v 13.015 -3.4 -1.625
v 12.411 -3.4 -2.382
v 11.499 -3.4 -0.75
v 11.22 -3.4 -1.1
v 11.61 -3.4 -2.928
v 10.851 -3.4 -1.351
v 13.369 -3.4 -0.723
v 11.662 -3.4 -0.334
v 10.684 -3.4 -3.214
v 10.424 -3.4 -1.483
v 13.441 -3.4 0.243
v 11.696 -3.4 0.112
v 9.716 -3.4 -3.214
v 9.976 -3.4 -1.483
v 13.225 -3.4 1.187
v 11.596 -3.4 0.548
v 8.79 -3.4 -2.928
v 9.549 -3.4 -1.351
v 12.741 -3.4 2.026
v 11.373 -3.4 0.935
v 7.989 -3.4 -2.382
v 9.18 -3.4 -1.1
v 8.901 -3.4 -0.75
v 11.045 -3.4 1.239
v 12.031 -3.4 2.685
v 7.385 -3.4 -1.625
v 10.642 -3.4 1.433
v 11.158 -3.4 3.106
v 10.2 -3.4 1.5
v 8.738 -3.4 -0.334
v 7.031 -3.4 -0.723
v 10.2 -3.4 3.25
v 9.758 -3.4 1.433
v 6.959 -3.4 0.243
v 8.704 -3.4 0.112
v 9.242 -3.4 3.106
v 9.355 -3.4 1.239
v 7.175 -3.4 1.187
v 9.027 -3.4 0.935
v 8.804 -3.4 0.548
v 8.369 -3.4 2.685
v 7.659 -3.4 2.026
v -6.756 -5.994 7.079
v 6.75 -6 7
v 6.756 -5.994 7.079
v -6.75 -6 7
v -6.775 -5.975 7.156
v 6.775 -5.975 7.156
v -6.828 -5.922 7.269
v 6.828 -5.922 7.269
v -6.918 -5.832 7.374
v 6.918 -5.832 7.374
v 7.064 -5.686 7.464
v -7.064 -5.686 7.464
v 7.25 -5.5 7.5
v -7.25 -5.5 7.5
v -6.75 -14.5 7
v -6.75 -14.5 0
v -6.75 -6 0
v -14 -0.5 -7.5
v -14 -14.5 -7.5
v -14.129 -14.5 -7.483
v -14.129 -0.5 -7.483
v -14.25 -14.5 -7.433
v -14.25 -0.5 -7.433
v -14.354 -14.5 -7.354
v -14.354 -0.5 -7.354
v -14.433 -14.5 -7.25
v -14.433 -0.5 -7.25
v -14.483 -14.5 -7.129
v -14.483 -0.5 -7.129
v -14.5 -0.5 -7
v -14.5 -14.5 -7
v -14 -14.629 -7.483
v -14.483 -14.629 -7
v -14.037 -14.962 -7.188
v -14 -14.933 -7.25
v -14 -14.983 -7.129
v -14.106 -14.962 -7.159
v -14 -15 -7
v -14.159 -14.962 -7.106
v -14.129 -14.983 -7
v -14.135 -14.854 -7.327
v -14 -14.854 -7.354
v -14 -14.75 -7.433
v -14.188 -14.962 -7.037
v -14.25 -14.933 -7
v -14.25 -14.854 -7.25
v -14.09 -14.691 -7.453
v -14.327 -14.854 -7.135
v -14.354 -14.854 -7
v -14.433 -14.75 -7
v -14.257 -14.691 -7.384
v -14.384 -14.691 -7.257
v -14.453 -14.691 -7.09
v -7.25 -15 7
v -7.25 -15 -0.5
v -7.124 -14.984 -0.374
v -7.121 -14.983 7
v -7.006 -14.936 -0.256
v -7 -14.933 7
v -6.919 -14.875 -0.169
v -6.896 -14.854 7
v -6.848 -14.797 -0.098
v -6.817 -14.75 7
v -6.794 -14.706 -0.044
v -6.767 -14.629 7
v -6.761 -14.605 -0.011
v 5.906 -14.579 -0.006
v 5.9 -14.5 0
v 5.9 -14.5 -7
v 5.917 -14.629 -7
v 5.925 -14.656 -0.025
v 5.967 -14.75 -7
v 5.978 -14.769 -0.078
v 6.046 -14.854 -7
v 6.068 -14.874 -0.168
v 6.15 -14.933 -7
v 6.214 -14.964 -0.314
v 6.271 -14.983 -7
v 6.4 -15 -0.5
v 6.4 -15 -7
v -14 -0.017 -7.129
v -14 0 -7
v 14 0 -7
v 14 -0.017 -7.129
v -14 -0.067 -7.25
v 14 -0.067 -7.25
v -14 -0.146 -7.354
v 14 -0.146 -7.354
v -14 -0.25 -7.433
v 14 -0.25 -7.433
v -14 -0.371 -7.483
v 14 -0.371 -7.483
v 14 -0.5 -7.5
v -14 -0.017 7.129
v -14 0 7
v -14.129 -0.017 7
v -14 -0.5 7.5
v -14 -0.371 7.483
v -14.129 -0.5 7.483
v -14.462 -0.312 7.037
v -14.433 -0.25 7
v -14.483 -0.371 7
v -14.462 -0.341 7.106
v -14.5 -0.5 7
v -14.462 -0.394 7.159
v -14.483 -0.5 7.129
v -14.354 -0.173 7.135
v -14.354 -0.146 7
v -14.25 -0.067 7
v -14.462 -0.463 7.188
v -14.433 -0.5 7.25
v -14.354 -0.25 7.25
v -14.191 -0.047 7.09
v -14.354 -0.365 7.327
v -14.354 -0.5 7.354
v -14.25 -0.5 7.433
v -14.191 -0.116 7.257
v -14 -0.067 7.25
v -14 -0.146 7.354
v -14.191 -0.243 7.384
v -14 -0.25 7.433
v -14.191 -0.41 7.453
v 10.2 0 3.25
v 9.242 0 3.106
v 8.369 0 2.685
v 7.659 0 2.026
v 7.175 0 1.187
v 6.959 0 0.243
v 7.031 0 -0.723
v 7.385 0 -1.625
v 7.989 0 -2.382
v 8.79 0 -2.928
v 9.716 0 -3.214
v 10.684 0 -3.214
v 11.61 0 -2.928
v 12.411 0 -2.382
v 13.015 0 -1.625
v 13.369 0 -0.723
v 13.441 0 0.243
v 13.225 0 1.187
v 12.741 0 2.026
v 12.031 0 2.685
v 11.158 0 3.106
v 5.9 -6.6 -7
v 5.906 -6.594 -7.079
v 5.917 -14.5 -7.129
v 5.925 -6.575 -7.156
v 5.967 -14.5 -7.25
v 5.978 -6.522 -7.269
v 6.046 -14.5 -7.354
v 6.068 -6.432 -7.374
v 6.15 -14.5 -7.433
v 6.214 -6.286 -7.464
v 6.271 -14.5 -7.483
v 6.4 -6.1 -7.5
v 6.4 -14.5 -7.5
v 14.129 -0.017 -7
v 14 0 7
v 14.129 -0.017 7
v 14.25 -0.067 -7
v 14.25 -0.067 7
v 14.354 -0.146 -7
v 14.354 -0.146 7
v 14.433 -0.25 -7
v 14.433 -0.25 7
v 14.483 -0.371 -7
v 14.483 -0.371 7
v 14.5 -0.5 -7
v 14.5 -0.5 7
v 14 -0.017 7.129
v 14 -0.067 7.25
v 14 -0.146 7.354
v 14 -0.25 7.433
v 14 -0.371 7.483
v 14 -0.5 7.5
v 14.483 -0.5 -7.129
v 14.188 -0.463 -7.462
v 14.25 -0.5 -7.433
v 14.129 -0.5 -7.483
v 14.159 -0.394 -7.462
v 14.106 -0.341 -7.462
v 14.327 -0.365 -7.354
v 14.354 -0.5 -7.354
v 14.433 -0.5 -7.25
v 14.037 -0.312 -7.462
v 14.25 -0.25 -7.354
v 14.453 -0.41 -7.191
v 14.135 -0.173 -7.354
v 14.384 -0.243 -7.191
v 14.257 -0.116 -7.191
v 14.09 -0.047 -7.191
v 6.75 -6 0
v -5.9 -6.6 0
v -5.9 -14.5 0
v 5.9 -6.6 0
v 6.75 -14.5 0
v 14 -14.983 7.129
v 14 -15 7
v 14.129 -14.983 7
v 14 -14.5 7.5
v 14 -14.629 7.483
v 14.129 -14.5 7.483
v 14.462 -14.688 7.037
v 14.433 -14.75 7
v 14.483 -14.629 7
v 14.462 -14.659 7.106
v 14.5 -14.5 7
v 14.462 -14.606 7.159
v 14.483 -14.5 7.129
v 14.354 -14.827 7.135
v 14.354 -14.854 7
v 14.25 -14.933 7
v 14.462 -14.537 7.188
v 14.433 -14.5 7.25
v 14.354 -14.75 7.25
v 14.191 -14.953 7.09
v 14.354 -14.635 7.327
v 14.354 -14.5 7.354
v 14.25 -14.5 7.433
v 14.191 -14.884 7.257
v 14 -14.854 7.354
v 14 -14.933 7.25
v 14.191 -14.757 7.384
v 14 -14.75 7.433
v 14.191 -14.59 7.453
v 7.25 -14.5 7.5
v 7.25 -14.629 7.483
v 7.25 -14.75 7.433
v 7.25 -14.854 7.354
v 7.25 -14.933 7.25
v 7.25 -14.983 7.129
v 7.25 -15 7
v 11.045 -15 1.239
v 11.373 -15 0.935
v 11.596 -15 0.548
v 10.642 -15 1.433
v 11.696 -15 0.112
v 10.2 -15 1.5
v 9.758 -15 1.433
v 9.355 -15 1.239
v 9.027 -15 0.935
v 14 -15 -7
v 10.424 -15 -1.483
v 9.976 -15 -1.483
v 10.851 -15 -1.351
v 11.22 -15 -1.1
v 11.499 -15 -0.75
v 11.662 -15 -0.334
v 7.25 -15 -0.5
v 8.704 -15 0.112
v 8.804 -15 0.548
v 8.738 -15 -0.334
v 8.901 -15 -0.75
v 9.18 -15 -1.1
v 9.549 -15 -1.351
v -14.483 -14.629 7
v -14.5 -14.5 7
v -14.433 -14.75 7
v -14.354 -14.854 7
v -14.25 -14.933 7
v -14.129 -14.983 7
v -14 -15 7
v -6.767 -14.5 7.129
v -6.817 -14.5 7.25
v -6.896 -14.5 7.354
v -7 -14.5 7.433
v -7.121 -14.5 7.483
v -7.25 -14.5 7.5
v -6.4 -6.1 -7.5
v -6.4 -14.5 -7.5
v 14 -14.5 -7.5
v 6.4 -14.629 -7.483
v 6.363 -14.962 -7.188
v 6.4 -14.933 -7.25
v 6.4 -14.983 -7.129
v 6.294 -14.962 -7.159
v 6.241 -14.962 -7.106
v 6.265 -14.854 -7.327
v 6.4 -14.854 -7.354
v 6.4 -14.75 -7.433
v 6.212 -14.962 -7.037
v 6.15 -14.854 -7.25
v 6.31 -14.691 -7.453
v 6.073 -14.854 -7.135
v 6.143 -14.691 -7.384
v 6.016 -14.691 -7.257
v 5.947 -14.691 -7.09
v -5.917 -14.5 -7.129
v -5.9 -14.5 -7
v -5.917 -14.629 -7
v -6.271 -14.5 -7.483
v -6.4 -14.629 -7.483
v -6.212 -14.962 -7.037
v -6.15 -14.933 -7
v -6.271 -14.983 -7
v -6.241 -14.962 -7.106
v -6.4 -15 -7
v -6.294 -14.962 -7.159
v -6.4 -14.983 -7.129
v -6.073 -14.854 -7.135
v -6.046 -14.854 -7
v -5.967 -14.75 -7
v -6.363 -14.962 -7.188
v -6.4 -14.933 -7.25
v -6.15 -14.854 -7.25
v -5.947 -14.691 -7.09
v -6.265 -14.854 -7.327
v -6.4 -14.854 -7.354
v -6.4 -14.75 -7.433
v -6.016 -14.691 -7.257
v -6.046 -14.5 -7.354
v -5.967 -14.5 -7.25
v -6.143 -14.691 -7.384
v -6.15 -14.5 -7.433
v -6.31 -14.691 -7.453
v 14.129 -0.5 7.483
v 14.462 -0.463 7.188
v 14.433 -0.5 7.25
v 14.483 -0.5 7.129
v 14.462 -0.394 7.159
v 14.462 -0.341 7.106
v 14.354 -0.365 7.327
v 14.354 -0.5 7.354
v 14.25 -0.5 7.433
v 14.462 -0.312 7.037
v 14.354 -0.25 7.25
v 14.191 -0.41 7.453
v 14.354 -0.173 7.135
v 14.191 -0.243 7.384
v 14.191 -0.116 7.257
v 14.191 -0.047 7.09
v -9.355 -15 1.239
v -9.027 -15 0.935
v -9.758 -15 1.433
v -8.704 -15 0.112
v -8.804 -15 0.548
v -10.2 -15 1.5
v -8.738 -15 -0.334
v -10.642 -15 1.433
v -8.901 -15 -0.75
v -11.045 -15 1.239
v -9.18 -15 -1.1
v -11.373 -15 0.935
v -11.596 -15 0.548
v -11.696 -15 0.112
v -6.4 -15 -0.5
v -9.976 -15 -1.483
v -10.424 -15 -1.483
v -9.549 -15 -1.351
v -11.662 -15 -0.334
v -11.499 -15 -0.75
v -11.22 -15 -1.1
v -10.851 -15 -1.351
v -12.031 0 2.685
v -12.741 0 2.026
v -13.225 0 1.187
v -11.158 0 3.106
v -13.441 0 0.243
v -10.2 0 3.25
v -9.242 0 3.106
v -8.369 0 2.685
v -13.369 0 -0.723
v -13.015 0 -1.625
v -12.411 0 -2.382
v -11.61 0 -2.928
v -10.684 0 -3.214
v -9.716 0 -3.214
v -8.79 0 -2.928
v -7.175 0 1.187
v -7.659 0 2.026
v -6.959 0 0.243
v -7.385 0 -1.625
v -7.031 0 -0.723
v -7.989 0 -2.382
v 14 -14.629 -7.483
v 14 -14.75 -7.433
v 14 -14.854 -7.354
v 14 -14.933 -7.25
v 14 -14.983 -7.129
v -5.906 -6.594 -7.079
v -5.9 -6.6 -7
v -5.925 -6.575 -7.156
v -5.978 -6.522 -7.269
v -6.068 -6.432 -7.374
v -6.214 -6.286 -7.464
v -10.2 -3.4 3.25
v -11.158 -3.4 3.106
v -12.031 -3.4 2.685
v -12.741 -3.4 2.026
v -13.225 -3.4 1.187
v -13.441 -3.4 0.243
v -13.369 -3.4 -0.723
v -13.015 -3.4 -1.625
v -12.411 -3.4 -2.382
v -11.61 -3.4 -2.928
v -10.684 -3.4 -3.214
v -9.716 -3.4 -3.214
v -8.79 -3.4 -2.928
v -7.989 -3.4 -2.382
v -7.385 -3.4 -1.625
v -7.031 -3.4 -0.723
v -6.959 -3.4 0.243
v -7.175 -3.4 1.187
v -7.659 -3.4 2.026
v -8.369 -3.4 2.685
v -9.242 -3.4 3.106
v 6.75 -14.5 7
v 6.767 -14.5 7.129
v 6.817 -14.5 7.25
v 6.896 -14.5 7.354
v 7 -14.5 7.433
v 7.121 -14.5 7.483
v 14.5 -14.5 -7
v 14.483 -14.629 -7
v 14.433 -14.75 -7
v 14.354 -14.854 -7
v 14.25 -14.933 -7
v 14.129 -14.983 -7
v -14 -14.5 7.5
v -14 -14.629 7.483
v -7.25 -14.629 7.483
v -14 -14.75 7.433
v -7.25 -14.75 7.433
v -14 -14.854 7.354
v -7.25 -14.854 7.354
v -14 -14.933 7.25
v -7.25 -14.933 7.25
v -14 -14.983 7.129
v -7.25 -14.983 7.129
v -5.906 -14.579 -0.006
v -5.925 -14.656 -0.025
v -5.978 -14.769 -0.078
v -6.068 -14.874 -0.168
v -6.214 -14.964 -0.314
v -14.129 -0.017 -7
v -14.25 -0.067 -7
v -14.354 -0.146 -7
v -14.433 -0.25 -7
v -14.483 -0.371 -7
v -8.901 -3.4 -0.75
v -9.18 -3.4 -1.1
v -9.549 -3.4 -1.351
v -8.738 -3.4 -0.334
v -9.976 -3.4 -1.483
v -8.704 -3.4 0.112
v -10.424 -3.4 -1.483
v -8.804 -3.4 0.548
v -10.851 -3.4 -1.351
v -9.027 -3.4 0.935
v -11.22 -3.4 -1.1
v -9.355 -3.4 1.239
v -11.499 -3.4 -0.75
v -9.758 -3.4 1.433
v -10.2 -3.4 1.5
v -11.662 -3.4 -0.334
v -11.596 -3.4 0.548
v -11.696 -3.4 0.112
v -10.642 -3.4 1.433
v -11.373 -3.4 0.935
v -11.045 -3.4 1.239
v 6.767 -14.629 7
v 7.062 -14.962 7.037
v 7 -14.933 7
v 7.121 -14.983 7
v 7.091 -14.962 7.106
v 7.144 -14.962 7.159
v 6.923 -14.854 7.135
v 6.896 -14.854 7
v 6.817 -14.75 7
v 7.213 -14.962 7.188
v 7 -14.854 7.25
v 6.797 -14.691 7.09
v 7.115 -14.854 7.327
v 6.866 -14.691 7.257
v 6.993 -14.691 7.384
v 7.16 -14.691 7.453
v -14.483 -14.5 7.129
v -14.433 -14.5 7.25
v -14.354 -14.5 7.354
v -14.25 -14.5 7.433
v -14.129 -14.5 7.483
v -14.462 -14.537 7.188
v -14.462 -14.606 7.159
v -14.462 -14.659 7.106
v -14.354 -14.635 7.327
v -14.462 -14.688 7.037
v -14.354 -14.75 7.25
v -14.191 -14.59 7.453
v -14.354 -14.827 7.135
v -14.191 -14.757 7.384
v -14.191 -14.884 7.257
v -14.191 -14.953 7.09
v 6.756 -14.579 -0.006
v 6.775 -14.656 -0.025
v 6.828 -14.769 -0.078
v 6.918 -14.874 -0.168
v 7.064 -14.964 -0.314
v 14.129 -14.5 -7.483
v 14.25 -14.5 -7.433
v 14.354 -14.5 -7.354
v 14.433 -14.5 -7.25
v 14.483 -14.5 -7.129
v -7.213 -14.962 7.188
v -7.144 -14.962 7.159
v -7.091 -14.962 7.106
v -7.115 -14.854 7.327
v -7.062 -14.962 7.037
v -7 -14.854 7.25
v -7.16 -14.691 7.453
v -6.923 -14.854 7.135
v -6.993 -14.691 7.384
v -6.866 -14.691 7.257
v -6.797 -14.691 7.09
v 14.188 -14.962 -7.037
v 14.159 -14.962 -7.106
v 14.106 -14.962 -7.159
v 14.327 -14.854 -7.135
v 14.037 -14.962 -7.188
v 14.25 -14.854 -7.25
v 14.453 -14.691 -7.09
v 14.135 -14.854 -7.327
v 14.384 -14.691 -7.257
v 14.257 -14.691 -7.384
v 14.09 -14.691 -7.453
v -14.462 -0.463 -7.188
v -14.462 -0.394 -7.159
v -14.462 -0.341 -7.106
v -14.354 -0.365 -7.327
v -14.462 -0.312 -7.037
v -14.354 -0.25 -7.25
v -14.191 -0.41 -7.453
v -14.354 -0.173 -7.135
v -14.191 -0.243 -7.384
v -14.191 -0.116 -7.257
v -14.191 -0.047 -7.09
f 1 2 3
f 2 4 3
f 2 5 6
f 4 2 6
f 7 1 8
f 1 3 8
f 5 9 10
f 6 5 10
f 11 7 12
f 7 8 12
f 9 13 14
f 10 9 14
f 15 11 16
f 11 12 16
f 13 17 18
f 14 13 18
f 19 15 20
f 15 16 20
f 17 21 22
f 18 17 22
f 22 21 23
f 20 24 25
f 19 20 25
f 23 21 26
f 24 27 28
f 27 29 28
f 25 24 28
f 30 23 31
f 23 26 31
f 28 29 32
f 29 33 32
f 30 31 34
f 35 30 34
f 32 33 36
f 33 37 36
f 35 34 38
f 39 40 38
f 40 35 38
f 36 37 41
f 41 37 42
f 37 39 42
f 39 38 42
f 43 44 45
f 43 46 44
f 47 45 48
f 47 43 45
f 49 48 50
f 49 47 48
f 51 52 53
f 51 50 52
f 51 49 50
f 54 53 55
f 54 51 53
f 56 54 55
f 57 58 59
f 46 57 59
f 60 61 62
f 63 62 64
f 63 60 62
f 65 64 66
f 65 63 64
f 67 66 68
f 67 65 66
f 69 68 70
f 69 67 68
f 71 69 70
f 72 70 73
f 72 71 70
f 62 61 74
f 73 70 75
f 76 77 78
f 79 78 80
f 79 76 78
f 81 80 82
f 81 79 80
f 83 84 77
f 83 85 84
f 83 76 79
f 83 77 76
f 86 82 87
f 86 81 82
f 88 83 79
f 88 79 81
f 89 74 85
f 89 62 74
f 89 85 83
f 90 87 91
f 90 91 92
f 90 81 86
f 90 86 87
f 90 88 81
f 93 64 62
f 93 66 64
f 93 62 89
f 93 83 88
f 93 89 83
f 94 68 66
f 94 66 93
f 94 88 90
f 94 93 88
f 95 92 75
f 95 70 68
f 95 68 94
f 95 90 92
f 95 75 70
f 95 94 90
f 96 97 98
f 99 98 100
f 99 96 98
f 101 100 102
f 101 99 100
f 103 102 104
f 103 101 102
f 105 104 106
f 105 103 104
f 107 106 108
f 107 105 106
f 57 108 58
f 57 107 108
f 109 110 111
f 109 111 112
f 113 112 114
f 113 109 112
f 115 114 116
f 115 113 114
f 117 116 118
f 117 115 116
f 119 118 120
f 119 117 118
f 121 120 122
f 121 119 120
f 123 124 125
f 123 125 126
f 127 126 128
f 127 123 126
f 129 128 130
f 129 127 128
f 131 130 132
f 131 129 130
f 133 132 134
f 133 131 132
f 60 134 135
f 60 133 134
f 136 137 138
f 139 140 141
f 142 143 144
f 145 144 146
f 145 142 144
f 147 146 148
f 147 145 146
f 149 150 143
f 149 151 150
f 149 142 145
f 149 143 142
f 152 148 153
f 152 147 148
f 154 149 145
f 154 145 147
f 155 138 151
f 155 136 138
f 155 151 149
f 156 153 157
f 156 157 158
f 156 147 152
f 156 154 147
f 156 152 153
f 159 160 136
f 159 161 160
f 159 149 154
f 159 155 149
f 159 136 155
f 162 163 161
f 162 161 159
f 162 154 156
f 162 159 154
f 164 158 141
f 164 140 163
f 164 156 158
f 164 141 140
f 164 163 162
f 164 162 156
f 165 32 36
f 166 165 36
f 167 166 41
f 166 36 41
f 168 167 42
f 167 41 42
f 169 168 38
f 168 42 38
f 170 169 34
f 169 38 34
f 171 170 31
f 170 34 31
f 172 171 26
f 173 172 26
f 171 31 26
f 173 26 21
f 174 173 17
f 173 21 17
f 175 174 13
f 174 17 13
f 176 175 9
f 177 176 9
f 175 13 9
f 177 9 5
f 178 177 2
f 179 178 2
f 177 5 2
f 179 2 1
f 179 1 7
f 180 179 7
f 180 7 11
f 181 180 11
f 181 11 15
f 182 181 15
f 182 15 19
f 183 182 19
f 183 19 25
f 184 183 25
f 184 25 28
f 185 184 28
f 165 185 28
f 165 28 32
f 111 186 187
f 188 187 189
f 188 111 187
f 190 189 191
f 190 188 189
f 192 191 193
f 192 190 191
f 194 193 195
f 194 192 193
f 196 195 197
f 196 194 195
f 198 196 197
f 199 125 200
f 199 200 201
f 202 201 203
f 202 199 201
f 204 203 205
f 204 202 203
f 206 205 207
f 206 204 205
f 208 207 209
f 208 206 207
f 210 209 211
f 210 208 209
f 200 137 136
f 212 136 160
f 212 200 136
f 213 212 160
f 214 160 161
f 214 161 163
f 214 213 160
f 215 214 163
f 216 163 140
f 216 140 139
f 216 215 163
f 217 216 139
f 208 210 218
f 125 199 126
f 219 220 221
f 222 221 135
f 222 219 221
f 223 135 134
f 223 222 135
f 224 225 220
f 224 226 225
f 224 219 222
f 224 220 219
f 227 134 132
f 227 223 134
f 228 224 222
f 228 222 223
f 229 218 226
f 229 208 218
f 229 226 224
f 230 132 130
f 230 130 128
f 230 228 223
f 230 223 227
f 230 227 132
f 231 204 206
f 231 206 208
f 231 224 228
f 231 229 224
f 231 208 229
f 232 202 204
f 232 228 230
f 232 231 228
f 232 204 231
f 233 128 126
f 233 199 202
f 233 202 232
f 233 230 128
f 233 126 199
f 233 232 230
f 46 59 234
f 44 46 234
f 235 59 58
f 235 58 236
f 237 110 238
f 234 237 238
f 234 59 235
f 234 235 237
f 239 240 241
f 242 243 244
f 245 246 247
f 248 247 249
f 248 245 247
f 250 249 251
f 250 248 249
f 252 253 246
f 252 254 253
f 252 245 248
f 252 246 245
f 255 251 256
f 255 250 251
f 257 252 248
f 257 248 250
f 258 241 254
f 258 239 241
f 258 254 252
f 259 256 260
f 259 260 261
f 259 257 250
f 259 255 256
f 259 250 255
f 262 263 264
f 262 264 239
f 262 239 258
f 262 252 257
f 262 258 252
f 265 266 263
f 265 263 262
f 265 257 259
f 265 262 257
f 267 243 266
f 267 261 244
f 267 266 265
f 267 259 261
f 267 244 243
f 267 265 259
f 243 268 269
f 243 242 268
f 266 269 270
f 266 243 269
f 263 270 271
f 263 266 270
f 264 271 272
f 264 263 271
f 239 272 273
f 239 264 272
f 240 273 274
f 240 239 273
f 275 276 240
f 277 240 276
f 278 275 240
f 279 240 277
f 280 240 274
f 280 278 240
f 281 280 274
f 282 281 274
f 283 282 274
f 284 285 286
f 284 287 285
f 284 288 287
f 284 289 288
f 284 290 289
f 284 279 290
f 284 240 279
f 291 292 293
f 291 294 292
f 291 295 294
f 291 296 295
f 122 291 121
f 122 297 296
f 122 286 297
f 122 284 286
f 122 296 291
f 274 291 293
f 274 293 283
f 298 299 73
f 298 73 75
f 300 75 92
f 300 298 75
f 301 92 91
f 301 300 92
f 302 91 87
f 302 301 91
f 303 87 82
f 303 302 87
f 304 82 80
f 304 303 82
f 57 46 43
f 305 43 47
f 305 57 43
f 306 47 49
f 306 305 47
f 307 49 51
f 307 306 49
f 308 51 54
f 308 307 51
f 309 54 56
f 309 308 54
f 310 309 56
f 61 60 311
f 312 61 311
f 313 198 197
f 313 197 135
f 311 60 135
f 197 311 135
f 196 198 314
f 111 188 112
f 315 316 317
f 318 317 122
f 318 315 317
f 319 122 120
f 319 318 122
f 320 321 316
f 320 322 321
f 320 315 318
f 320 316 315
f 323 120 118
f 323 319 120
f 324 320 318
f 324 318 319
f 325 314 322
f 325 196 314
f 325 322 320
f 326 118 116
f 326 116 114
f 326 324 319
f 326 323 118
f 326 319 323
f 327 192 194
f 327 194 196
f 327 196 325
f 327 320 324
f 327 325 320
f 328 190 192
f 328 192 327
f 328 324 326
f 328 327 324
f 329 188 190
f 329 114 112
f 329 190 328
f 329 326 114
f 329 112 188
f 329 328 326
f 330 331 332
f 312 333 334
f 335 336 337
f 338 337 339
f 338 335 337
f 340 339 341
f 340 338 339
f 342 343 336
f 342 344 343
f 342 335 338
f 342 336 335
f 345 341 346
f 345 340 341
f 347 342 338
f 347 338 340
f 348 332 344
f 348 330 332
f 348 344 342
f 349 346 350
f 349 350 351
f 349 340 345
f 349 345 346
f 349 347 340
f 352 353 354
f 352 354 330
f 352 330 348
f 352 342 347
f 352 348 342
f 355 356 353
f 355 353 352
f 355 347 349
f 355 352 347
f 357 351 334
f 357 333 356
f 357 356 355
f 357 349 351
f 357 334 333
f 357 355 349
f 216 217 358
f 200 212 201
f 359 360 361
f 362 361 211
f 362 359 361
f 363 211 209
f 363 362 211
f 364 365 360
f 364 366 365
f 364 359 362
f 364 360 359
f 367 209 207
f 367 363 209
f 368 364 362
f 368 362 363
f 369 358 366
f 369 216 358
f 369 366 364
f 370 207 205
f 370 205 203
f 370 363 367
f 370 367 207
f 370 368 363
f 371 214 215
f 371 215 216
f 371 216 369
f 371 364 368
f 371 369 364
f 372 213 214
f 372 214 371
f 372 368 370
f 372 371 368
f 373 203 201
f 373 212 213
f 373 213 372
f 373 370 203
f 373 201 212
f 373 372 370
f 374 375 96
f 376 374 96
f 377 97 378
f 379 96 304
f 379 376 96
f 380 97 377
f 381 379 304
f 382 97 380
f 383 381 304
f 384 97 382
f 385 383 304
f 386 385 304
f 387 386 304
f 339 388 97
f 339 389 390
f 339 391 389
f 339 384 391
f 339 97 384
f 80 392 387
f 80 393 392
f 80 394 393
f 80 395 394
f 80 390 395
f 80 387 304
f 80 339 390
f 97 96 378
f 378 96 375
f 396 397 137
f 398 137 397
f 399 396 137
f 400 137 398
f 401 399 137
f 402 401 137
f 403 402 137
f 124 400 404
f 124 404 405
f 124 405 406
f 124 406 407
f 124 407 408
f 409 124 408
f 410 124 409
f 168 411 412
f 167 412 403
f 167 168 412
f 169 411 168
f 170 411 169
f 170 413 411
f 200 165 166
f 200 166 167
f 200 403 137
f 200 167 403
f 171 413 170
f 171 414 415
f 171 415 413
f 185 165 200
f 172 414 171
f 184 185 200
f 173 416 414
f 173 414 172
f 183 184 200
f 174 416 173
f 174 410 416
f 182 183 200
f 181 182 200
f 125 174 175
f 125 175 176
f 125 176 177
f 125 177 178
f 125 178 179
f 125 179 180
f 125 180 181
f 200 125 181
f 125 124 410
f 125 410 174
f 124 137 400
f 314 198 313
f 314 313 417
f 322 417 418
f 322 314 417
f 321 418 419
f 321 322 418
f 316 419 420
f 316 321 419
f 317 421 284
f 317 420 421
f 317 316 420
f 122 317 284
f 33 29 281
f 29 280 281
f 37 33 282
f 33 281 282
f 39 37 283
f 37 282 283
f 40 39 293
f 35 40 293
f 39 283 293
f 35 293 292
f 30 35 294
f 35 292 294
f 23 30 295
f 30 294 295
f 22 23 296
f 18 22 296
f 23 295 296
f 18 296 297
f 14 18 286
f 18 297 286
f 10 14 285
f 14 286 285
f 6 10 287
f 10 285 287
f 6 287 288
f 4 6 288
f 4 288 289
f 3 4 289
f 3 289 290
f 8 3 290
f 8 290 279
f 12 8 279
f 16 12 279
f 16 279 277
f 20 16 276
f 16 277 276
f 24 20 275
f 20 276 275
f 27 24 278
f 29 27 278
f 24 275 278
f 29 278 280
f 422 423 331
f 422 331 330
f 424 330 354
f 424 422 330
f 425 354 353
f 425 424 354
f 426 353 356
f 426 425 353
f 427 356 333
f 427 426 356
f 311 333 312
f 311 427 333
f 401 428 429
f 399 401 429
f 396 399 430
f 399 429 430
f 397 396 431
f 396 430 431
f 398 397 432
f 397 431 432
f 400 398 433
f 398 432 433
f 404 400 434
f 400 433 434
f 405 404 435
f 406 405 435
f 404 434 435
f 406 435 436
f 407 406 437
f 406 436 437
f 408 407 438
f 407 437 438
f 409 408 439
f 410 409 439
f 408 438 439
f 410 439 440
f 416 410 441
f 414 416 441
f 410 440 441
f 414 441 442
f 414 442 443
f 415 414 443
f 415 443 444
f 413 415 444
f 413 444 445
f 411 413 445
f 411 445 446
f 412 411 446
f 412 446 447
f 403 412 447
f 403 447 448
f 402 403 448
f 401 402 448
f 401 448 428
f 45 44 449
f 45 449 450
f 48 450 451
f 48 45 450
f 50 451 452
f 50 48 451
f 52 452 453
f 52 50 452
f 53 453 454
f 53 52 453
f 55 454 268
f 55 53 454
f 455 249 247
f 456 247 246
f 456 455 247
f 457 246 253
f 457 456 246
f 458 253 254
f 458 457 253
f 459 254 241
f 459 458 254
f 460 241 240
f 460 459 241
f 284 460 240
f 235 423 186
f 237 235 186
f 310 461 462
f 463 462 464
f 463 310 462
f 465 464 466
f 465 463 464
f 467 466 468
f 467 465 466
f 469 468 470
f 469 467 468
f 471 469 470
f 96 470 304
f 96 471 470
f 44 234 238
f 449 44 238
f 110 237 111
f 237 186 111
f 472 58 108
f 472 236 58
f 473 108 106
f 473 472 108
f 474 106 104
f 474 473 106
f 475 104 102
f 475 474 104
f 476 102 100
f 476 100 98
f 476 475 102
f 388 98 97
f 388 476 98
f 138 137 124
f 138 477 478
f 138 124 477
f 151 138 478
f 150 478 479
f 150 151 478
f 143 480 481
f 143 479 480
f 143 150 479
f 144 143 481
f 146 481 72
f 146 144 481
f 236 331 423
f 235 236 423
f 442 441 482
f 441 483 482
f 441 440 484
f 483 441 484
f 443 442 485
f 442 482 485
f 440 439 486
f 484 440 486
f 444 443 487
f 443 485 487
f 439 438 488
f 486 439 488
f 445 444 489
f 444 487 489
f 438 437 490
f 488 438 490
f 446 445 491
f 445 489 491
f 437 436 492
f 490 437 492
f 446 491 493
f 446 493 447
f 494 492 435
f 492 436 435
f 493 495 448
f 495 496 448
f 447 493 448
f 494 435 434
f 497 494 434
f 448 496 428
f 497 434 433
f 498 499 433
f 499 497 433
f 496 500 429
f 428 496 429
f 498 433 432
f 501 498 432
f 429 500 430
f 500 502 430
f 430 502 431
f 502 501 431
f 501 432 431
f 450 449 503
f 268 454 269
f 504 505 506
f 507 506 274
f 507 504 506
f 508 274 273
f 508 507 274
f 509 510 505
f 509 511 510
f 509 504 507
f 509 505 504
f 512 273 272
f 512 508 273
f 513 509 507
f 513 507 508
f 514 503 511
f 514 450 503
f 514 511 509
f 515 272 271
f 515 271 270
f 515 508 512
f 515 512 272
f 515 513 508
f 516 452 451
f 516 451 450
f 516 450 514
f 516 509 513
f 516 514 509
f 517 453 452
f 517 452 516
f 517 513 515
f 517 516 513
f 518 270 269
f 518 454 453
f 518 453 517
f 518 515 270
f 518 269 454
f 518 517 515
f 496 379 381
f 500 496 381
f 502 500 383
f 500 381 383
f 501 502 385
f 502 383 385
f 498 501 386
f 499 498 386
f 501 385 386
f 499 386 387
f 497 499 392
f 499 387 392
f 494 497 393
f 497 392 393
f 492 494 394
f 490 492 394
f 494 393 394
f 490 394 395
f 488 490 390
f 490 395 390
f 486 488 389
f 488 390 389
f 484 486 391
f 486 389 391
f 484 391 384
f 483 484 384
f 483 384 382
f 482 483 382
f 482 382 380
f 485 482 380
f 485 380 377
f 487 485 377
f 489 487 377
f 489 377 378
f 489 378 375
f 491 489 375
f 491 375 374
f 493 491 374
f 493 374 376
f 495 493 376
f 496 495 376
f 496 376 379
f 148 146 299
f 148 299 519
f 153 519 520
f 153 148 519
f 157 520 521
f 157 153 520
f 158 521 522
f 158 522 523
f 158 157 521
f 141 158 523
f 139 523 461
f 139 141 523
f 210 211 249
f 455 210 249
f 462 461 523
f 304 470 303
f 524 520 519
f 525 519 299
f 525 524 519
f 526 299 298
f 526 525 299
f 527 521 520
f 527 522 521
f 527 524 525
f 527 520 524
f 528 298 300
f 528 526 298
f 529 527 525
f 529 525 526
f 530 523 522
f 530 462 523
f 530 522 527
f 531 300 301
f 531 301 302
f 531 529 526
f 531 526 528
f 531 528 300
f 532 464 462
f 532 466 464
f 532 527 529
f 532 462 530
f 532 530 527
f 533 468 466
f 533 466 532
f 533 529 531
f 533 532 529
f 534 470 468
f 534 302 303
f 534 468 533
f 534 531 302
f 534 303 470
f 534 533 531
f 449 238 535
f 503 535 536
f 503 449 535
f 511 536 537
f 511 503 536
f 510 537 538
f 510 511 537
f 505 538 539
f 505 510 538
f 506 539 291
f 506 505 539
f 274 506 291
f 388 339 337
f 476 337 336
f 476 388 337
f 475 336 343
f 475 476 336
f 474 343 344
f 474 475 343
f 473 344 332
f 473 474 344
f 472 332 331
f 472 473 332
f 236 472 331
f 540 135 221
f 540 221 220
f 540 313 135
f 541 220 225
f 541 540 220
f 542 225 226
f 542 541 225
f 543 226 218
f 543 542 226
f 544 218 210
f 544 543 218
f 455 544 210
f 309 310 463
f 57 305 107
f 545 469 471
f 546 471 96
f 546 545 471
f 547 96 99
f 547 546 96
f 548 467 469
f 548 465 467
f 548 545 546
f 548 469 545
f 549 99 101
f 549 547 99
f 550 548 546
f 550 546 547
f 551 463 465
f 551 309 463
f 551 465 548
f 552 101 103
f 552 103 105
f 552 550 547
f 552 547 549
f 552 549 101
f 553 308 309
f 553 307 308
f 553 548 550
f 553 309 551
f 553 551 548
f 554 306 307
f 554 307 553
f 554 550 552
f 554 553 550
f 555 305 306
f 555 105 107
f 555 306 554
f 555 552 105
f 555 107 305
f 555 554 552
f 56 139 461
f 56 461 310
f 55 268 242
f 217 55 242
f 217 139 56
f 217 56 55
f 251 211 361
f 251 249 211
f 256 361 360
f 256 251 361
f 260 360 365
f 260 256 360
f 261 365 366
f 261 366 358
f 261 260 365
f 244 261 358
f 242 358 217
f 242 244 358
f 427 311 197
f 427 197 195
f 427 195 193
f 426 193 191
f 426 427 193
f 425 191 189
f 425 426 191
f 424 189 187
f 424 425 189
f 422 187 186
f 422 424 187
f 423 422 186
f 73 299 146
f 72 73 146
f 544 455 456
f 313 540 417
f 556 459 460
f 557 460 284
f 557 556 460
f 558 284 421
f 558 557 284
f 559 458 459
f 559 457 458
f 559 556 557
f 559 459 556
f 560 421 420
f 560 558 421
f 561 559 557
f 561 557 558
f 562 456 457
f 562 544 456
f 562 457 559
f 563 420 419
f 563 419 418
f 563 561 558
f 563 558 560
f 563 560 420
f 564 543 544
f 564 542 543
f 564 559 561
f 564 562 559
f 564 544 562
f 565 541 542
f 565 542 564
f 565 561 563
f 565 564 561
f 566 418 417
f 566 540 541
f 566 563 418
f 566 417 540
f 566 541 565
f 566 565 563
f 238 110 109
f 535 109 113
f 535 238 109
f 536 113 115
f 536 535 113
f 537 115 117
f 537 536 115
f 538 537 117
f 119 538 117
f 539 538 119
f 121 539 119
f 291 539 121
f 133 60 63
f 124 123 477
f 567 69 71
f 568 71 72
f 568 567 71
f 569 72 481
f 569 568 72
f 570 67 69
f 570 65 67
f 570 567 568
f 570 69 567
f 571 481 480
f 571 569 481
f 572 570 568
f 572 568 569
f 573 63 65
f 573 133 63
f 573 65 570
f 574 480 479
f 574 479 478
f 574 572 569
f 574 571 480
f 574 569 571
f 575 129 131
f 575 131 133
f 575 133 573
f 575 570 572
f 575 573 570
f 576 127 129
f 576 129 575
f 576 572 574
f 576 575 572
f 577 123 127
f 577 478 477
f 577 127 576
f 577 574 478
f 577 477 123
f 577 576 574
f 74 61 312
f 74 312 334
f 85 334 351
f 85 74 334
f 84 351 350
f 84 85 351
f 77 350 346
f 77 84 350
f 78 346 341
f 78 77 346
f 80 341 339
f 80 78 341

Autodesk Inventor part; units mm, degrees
ref_plane "YZ Plane" through (0, 0, 0) normal (1, 0, 0) x (0, 1, 0)
ref_plane "XZ Plane" through (0, 0, 0) normal (0, 1, 0) x (-1, 0, 0)
ref_plane "XY Plane" through (0, 0, 0) normal (0, 0, 1) x (1, 0, 0)
sketch "Skizze1" plane through (0, 0, 0) normal (0, 0, 1) x (1, 0, 0)
  line L0 (-14.5, 0) -> (14.5, 0)
  line L1 (14.5, 0) -> (14.5, -15)
  line L2 (-14.5, -15) -> (-14.5, 0)
  line L3 (-5.9, -15) -> (-5.9, -6.6)
  line L4 (-5.9, -6.6) -> (5.9, -6.6)
  line L5 (5.9, -6.6) -> (5.9, -15)
  line L6 (14.5, -15) -> (5.9, -15)
  line L7 (-5.9, -15) -> (-14.5, -15)
  line L8 (0, 0) -> (0, -6.6)
  line L9 (-10.2, -15) -> (-10.2, 0)
  line L10 (10.2, -15) -> (10.2, 0)
  dimension "d0" = 11.8
  dimension "d1" = 8.4
  dimension "d2" = 29
  dimension "d3" = 15
extrude "Extrusion1" add sketch "Skizze1" along normal mid plane 15
sketch "Skizze2" plane through (0, 0, 0) normal (0, 0, 1) x (1, 0, 0)
  line L0 (5.9, -15) -> (14.5, -15) projected
  line L1 (6.75, -15) -> (-6.75, -15)
  line L2 (-6.75, -15) -> (-6.75, -6)
  line L3 (-6.75, -6) -> (6.75, -6)
  line L4 (6.75, -6) -> (6.75, -15)
  line L5 (0, -18) -> (0, 3) projected
  point P0 (0, 0)
  point P1 (0, -6)
  dimension "d6" = 13.5
  dimension "d7" = 9
extrude "Extrusion2" cut sketch "Skizze2" along normal through all
sketch "Skizze3" plane through (-14.5, 0, 7.5) normal (0, 1, 0) x (1, 0, 0)
  point P0 (14.5, 7.5)
  point P1 (4.3, 7.5)
  point P2 (24.7, 7.5)
hole "Bohrung1" at (-10.2, 0, 0) at (10.2, 0, 0) direction (0, -1, 0) diameter 3 end through all counterbore diameter 6.5 counterbore depth 3.4 clearance for "Inbusschraube DIN EN ISO 4762" size "M3" standard "DIN"
fillet "Rundung1" radius 0.5 26 edges at (0, 0, 7.5) (14.5, 0, 0) (0, 0, -7.5) (-14.5, 0, 0) (-6.75, -10.5, 7.5) (0, -6, 7.5) (-10.625, -15, 7.5) (-14.5, -7.5, 7.5) (6.75, -10.5, 7.5) (10.625, -15, 7.5) (14.5, -7.5, 7.5) (14.5, -7.5, -7.5) (14.5, -15, 0) (5.9, -10.8, -7.5) (0, -6.6, -7.5) (-5.9, -10.8, -7.5) (-14.5, -7.5, -7.5) (-10.2, -15, -7.5) (-5.9, -15, -3.75) (-6.75, -15, 3.75) (-14.5, -15, 0) (-6.325, -15, 0) (6.325, -15, 0) (6.75, -15, 3.75) (5.9, -15, -3.75) (10.2, -15, -7.5)
properties part number "connector_securing_V1" material "ABS-Kunststoff"
